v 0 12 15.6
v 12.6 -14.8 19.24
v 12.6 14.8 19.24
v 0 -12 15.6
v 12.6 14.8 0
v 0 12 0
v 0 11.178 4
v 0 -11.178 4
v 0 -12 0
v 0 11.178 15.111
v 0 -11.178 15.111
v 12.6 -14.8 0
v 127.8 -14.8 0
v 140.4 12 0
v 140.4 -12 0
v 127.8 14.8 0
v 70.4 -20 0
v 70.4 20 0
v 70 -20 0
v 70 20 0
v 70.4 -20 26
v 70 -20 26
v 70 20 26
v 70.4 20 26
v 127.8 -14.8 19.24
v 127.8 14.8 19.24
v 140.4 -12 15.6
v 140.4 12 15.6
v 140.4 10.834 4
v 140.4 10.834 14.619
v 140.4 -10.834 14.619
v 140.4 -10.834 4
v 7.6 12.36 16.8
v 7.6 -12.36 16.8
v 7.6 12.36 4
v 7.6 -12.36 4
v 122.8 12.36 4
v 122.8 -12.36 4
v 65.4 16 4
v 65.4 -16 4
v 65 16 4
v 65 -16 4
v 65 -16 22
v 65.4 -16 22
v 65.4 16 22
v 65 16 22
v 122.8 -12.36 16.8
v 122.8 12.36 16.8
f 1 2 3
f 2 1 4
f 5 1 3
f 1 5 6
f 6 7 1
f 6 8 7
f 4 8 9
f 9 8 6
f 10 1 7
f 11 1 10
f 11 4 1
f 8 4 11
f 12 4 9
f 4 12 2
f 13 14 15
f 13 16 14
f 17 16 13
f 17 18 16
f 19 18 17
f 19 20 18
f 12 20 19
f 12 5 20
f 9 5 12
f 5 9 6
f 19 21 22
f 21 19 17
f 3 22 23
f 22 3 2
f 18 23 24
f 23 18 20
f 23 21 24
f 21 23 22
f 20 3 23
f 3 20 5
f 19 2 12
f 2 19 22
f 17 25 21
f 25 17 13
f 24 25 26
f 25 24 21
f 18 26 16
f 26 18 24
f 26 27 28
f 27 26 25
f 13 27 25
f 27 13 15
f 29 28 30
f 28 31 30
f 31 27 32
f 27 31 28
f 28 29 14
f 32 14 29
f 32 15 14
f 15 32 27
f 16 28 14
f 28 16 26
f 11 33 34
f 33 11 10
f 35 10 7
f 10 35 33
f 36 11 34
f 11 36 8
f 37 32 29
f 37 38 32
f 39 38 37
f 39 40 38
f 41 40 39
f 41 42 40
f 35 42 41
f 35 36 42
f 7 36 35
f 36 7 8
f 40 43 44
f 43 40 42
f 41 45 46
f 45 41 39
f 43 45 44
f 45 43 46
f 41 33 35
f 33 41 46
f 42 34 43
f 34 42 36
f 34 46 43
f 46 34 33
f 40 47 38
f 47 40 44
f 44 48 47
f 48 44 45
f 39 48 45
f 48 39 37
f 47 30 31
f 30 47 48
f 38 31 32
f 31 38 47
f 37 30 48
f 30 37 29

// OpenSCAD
$fn = 32;

// ----------------------------------------------------------------------
// Faired channel: 140 x 40 x 26 mm, 4 mm walls, faired ends
// ----------------------------------------------------------------------

// --- parameters (mm) ---
length = 140;             // channel length
width = 40;               // channel width at mid length
height = 26;              // channel height at mid length
wall = 4;                 // side wall thickness
floor_t = 4;              // floor thickness
end_w = 24;               // faired end width
end_h = 15.6;             // faired end height

difference() {
  union() {
    hull() {
      translate([0, -12, 0]) cube([0.4, 24, 15.6]);
      translate([12.6, -14.8, 0]) cube([0.4, 29.6, 19.24]);
    }
    hull() {
      translate([12.6, -14.8, 0]) cube([0.4, 29.6, 19.24]);
      translate([70, -20, 0]) cube([0.4, 40, 26]);
    }
    hull() {
      translate([70, -20, 0]) cube([0.4, 40, 26]);
      translate([127.4, -14.8, 0]) cube([0.4, 29.6, 19.24]);
    }
    hull() {
      translate([127.4, -14.8, 0]) cube([0.4, 29.6, 19.24]);
      translate([140, -12, 0]) cube([0.4, 24, 15.6]);
    }
  }
  /* cavity, 5 mm proud of both ends so the ports are cut clean */
  hull() {
    translate([-5, -10.4, 4]) cube([0.4, 20.8, 10]);
    translate([7.6, -12.36, 4]) cube([0.4, 24.72, 12.8]);
  }
  hull() {
    translate([7.6, -12.36, 4]) cube([0.4, 24.72, 12.8]);
    translate([65, -16, 4]) cube([0.4, 32, 18]);
  }
  hull() {
    translate([65, -16, 4]) cube([0.4, 32, 18]);
    translate([122.4, -12.36, 4]) cube([0.4, 24.72, 12.8]);
  }
  hull() {
    translate([122.4, -12.36, 4]) cube([0.4, 24.72, 12.8]);
    translate([145, -10.4, 4]) cube([0.4, 20.8, 10]);
  }
}
